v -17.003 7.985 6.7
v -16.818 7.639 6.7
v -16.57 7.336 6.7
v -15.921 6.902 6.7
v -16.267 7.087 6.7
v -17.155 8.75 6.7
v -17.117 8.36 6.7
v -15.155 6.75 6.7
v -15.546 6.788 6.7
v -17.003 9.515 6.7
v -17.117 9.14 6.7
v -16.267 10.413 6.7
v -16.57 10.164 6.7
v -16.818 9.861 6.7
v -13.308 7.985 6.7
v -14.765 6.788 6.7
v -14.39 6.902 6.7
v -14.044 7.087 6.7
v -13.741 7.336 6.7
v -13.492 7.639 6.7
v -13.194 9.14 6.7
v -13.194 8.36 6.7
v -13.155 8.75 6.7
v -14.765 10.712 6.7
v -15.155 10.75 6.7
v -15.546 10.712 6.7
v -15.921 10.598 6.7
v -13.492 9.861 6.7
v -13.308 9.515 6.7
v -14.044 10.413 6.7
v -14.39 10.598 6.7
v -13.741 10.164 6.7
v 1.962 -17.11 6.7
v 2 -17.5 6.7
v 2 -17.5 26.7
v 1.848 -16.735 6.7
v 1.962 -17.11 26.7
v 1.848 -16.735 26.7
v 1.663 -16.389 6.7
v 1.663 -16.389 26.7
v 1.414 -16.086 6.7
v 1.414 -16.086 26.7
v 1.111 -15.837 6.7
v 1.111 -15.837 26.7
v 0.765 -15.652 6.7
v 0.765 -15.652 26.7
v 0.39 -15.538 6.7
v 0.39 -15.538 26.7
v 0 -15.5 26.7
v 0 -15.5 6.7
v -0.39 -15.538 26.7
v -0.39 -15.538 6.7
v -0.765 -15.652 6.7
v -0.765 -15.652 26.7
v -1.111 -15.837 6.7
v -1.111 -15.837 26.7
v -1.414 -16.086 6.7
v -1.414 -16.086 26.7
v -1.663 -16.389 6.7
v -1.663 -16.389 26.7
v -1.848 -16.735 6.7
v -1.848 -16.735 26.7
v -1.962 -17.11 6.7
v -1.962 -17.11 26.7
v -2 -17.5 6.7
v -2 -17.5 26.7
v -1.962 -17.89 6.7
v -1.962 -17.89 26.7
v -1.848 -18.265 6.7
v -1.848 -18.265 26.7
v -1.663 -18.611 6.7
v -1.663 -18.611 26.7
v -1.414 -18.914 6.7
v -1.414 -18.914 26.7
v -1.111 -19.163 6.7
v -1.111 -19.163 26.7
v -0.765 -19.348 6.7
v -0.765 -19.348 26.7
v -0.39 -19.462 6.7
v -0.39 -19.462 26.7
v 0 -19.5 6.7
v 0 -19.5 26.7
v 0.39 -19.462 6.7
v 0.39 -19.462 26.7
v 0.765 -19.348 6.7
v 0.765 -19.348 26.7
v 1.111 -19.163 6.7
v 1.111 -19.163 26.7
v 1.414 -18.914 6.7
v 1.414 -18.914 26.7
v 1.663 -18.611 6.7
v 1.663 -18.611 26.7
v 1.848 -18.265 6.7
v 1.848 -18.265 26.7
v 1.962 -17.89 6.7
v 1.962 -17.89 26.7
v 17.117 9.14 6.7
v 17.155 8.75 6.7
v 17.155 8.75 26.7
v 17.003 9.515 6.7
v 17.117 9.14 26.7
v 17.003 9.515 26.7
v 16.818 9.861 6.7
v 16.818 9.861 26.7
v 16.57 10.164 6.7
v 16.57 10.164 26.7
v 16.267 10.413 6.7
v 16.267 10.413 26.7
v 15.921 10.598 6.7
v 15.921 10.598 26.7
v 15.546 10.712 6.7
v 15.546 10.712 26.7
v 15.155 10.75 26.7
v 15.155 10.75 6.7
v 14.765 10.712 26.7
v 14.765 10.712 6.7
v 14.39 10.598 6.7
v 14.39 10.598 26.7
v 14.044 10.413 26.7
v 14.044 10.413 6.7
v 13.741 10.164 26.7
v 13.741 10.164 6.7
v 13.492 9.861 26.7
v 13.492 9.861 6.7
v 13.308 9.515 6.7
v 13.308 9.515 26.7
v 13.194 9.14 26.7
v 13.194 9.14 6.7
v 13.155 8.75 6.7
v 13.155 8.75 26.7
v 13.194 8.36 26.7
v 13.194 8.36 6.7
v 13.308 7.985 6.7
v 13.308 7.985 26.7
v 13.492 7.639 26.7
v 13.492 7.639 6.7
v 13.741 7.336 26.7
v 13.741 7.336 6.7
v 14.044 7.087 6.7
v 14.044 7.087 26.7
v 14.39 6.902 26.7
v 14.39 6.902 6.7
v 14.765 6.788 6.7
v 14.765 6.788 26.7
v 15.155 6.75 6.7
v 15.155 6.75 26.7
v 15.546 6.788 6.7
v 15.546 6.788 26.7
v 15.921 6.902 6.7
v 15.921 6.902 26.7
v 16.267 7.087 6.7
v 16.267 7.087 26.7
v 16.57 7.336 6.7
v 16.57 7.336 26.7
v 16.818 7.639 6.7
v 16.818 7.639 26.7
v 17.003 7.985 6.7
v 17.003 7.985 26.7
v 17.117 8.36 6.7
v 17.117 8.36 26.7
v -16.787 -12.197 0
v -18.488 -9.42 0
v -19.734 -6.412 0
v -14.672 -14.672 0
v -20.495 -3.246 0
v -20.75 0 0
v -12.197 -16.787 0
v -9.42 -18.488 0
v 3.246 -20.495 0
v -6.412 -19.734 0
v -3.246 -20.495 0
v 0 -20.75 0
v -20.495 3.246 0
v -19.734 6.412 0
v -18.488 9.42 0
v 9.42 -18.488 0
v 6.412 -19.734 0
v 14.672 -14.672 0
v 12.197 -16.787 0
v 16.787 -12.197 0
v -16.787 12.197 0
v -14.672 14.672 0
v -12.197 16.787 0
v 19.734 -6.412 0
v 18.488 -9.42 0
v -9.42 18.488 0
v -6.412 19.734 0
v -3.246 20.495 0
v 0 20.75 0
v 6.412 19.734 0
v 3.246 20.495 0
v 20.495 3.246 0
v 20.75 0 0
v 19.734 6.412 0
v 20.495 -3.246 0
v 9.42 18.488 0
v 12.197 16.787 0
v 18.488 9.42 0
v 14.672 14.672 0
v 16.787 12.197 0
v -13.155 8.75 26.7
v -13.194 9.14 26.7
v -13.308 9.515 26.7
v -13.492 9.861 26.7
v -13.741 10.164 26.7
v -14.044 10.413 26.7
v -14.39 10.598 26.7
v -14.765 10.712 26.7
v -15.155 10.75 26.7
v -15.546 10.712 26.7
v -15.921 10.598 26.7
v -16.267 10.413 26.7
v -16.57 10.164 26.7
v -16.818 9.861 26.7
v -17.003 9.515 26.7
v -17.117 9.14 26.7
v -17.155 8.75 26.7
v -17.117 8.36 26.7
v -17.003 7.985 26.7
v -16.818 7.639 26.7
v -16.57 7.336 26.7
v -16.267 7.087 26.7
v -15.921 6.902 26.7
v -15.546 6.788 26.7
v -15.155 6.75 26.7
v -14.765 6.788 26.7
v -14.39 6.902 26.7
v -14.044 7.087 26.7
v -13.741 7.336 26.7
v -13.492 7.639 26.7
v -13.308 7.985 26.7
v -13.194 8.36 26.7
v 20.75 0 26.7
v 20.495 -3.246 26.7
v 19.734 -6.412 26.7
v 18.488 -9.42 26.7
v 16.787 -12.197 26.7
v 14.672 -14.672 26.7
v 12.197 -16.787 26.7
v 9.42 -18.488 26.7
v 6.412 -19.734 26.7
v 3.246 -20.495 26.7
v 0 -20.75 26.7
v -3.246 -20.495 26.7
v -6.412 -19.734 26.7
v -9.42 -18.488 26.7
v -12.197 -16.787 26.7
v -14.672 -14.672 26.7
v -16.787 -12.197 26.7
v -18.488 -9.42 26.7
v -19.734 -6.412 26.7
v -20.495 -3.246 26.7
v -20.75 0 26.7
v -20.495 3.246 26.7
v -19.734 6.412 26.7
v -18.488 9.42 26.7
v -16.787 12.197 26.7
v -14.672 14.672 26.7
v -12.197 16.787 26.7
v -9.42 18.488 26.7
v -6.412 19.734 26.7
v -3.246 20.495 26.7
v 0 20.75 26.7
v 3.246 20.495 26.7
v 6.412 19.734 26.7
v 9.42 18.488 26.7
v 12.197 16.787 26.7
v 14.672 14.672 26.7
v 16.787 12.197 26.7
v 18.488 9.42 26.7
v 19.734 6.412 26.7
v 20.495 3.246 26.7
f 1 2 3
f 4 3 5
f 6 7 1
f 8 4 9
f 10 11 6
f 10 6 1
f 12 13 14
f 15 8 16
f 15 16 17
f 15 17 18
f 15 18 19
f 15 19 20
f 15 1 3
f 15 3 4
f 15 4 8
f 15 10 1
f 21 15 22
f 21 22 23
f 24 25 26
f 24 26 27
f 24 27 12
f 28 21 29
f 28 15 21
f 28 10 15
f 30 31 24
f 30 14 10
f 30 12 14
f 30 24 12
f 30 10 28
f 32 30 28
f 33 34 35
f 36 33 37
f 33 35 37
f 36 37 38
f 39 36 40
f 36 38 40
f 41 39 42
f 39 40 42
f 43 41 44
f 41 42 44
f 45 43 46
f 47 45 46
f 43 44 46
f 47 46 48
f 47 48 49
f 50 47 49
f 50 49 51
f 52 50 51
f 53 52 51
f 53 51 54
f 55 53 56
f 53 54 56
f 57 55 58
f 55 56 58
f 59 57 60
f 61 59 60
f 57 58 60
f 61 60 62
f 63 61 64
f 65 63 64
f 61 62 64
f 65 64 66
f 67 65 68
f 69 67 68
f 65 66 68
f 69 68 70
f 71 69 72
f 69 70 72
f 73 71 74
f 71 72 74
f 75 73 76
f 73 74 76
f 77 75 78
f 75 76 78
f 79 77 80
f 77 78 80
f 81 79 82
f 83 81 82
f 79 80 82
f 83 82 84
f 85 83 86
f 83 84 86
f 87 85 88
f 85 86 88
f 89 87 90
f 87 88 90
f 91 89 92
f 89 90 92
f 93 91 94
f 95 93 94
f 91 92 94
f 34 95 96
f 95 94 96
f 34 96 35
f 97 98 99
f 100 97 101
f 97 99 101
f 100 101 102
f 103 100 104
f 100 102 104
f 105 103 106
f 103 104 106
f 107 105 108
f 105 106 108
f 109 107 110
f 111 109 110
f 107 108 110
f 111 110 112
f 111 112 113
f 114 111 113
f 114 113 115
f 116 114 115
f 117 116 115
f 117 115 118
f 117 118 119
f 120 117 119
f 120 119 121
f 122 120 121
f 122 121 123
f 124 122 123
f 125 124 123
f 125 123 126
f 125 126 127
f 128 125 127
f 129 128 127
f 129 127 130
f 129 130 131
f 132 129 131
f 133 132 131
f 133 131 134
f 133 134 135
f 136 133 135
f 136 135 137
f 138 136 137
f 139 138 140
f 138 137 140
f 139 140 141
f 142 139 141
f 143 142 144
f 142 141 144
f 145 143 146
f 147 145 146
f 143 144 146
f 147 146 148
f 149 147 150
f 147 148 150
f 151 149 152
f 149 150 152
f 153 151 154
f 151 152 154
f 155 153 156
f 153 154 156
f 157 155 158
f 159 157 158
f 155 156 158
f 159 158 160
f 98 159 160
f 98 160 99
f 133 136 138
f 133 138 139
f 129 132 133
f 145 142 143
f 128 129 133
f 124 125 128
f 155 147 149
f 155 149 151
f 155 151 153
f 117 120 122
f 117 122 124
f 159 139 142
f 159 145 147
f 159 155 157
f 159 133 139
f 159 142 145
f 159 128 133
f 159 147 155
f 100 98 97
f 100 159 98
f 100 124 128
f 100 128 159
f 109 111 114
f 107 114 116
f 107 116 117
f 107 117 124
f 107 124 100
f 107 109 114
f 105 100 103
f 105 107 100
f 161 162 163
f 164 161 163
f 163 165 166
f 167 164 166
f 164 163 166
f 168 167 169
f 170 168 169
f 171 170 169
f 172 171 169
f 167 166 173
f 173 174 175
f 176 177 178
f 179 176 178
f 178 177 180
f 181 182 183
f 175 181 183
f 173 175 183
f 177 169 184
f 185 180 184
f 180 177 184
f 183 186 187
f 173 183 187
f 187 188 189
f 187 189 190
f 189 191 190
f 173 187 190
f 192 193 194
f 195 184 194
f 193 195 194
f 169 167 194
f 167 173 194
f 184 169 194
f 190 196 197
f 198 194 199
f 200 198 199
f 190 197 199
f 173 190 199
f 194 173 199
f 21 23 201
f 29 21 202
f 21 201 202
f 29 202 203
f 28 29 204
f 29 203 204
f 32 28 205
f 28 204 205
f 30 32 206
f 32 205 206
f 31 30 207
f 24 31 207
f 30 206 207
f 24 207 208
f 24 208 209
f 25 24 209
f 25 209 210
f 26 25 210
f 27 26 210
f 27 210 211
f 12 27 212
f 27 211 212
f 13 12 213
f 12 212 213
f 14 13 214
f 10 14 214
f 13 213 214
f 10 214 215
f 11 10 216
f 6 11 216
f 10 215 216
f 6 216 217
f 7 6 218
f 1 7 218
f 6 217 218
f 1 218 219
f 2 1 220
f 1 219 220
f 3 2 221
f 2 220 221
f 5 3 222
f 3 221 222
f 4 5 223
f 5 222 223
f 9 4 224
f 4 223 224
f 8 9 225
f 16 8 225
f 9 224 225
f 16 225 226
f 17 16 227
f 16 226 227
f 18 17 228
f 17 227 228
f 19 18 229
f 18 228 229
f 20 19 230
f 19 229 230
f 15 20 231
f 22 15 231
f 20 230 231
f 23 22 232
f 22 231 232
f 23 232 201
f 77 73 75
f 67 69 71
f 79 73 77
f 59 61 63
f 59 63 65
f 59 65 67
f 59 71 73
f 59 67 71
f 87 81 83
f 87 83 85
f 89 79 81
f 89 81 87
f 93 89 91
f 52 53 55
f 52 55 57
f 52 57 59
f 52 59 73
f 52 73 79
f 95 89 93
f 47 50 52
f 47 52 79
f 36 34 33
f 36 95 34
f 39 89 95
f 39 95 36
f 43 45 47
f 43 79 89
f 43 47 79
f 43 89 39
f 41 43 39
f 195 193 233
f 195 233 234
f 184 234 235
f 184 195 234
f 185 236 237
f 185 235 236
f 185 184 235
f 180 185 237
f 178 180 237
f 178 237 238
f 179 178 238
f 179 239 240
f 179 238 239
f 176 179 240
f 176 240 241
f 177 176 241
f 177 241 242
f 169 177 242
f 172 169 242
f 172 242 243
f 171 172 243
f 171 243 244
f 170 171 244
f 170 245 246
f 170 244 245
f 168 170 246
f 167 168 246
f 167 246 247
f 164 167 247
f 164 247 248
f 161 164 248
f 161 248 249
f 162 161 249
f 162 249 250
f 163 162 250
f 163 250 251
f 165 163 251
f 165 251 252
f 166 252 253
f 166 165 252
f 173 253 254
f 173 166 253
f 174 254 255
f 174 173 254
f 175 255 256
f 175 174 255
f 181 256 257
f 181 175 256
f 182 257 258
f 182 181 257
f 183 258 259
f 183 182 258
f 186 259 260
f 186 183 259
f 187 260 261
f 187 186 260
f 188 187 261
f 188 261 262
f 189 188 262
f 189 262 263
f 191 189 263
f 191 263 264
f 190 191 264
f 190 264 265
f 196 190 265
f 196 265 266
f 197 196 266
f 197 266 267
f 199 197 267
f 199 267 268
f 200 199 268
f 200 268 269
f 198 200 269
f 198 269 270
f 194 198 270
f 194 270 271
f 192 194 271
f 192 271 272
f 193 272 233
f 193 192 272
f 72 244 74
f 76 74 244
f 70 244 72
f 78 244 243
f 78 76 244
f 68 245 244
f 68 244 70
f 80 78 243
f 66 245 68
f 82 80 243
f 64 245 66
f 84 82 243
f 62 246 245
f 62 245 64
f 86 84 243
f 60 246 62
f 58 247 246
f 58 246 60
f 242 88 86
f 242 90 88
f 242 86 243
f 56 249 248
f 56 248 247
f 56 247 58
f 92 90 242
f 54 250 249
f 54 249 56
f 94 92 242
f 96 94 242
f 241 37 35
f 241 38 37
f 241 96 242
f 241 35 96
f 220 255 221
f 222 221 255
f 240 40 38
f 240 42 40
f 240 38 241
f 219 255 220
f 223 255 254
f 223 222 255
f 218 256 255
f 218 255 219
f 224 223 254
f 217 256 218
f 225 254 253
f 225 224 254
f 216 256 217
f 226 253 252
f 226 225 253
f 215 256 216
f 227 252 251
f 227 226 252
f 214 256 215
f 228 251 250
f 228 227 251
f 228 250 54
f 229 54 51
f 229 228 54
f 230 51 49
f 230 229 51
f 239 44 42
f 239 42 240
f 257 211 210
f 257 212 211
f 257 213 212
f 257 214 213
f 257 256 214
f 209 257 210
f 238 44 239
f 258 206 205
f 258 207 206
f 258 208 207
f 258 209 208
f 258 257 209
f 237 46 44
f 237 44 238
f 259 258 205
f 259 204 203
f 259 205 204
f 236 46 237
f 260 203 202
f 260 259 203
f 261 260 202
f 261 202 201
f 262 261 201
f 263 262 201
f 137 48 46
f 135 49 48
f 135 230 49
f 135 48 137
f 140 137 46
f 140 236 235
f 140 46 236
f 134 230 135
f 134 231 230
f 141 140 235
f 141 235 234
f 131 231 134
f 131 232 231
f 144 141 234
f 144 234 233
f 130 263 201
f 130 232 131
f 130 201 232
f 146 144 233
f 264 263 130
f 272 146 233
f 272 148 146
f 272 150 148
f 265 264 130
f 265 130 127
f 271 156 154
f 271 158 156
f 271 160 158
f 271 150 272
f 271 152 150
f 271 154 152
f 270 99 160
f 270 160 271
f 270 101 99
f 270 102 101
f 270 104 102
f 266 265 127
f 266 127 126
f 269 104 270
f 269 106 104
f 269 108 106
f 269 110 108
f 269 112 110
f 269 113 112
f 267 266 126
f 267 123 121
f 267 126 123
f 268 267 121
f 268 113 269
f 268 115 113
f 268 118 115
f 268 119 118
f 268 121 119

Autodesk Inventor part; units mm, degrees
ref_plane "YZ Plane" through (0, 0, 0) normal (1, 0, 0) x (0, 1, 0)
ref_plane "XZ Plane" through (0, 0, 0) normal (0, 1, 0) x (-1, 0, 0)
ref_plane "XY Plane" through (0, 0, 0) normal (0, 0, 1) x (1, 0, 0)
sketch "Sketch1" plane through (0, 0, 0) normal (0, 0, 1) x (1, 0, 0)
  circle A0 centre (0, 0) radius 20.75
  dimension "d0" = 41.5
extrude "Extrusion1" add sketch "Sketch1" along normal blind 26.7
sketch "Sketch2" plane through (0, 0, 26.7) normal (0, 0, 1) x (1, 0, 0)
  circle A0 centre (-15.1554, 8.75) radius 2
  circle A1 centre (15.1554, 8.75) radius 2
  circle A2 centre (0, -17.5) radius 2
  circle A3 centre (0, 0) radius 17.5 construction
  line L0 (0, 0) -> (-15.1554, 8.75) construction
  line L1 (0, 0) -> (15.1554, 8.75) construction
  line L2 (0, 0) -> (0, -17.5) construction
  dimension "d3" = 35
  dimension "d4" = 120
  dimension "d5" = 120
  dimension "d6" = 4
extrude "Extrusion2" cut sketch "Sketch2" against normal blind 20
properties part number "Hoverboard Frame"
